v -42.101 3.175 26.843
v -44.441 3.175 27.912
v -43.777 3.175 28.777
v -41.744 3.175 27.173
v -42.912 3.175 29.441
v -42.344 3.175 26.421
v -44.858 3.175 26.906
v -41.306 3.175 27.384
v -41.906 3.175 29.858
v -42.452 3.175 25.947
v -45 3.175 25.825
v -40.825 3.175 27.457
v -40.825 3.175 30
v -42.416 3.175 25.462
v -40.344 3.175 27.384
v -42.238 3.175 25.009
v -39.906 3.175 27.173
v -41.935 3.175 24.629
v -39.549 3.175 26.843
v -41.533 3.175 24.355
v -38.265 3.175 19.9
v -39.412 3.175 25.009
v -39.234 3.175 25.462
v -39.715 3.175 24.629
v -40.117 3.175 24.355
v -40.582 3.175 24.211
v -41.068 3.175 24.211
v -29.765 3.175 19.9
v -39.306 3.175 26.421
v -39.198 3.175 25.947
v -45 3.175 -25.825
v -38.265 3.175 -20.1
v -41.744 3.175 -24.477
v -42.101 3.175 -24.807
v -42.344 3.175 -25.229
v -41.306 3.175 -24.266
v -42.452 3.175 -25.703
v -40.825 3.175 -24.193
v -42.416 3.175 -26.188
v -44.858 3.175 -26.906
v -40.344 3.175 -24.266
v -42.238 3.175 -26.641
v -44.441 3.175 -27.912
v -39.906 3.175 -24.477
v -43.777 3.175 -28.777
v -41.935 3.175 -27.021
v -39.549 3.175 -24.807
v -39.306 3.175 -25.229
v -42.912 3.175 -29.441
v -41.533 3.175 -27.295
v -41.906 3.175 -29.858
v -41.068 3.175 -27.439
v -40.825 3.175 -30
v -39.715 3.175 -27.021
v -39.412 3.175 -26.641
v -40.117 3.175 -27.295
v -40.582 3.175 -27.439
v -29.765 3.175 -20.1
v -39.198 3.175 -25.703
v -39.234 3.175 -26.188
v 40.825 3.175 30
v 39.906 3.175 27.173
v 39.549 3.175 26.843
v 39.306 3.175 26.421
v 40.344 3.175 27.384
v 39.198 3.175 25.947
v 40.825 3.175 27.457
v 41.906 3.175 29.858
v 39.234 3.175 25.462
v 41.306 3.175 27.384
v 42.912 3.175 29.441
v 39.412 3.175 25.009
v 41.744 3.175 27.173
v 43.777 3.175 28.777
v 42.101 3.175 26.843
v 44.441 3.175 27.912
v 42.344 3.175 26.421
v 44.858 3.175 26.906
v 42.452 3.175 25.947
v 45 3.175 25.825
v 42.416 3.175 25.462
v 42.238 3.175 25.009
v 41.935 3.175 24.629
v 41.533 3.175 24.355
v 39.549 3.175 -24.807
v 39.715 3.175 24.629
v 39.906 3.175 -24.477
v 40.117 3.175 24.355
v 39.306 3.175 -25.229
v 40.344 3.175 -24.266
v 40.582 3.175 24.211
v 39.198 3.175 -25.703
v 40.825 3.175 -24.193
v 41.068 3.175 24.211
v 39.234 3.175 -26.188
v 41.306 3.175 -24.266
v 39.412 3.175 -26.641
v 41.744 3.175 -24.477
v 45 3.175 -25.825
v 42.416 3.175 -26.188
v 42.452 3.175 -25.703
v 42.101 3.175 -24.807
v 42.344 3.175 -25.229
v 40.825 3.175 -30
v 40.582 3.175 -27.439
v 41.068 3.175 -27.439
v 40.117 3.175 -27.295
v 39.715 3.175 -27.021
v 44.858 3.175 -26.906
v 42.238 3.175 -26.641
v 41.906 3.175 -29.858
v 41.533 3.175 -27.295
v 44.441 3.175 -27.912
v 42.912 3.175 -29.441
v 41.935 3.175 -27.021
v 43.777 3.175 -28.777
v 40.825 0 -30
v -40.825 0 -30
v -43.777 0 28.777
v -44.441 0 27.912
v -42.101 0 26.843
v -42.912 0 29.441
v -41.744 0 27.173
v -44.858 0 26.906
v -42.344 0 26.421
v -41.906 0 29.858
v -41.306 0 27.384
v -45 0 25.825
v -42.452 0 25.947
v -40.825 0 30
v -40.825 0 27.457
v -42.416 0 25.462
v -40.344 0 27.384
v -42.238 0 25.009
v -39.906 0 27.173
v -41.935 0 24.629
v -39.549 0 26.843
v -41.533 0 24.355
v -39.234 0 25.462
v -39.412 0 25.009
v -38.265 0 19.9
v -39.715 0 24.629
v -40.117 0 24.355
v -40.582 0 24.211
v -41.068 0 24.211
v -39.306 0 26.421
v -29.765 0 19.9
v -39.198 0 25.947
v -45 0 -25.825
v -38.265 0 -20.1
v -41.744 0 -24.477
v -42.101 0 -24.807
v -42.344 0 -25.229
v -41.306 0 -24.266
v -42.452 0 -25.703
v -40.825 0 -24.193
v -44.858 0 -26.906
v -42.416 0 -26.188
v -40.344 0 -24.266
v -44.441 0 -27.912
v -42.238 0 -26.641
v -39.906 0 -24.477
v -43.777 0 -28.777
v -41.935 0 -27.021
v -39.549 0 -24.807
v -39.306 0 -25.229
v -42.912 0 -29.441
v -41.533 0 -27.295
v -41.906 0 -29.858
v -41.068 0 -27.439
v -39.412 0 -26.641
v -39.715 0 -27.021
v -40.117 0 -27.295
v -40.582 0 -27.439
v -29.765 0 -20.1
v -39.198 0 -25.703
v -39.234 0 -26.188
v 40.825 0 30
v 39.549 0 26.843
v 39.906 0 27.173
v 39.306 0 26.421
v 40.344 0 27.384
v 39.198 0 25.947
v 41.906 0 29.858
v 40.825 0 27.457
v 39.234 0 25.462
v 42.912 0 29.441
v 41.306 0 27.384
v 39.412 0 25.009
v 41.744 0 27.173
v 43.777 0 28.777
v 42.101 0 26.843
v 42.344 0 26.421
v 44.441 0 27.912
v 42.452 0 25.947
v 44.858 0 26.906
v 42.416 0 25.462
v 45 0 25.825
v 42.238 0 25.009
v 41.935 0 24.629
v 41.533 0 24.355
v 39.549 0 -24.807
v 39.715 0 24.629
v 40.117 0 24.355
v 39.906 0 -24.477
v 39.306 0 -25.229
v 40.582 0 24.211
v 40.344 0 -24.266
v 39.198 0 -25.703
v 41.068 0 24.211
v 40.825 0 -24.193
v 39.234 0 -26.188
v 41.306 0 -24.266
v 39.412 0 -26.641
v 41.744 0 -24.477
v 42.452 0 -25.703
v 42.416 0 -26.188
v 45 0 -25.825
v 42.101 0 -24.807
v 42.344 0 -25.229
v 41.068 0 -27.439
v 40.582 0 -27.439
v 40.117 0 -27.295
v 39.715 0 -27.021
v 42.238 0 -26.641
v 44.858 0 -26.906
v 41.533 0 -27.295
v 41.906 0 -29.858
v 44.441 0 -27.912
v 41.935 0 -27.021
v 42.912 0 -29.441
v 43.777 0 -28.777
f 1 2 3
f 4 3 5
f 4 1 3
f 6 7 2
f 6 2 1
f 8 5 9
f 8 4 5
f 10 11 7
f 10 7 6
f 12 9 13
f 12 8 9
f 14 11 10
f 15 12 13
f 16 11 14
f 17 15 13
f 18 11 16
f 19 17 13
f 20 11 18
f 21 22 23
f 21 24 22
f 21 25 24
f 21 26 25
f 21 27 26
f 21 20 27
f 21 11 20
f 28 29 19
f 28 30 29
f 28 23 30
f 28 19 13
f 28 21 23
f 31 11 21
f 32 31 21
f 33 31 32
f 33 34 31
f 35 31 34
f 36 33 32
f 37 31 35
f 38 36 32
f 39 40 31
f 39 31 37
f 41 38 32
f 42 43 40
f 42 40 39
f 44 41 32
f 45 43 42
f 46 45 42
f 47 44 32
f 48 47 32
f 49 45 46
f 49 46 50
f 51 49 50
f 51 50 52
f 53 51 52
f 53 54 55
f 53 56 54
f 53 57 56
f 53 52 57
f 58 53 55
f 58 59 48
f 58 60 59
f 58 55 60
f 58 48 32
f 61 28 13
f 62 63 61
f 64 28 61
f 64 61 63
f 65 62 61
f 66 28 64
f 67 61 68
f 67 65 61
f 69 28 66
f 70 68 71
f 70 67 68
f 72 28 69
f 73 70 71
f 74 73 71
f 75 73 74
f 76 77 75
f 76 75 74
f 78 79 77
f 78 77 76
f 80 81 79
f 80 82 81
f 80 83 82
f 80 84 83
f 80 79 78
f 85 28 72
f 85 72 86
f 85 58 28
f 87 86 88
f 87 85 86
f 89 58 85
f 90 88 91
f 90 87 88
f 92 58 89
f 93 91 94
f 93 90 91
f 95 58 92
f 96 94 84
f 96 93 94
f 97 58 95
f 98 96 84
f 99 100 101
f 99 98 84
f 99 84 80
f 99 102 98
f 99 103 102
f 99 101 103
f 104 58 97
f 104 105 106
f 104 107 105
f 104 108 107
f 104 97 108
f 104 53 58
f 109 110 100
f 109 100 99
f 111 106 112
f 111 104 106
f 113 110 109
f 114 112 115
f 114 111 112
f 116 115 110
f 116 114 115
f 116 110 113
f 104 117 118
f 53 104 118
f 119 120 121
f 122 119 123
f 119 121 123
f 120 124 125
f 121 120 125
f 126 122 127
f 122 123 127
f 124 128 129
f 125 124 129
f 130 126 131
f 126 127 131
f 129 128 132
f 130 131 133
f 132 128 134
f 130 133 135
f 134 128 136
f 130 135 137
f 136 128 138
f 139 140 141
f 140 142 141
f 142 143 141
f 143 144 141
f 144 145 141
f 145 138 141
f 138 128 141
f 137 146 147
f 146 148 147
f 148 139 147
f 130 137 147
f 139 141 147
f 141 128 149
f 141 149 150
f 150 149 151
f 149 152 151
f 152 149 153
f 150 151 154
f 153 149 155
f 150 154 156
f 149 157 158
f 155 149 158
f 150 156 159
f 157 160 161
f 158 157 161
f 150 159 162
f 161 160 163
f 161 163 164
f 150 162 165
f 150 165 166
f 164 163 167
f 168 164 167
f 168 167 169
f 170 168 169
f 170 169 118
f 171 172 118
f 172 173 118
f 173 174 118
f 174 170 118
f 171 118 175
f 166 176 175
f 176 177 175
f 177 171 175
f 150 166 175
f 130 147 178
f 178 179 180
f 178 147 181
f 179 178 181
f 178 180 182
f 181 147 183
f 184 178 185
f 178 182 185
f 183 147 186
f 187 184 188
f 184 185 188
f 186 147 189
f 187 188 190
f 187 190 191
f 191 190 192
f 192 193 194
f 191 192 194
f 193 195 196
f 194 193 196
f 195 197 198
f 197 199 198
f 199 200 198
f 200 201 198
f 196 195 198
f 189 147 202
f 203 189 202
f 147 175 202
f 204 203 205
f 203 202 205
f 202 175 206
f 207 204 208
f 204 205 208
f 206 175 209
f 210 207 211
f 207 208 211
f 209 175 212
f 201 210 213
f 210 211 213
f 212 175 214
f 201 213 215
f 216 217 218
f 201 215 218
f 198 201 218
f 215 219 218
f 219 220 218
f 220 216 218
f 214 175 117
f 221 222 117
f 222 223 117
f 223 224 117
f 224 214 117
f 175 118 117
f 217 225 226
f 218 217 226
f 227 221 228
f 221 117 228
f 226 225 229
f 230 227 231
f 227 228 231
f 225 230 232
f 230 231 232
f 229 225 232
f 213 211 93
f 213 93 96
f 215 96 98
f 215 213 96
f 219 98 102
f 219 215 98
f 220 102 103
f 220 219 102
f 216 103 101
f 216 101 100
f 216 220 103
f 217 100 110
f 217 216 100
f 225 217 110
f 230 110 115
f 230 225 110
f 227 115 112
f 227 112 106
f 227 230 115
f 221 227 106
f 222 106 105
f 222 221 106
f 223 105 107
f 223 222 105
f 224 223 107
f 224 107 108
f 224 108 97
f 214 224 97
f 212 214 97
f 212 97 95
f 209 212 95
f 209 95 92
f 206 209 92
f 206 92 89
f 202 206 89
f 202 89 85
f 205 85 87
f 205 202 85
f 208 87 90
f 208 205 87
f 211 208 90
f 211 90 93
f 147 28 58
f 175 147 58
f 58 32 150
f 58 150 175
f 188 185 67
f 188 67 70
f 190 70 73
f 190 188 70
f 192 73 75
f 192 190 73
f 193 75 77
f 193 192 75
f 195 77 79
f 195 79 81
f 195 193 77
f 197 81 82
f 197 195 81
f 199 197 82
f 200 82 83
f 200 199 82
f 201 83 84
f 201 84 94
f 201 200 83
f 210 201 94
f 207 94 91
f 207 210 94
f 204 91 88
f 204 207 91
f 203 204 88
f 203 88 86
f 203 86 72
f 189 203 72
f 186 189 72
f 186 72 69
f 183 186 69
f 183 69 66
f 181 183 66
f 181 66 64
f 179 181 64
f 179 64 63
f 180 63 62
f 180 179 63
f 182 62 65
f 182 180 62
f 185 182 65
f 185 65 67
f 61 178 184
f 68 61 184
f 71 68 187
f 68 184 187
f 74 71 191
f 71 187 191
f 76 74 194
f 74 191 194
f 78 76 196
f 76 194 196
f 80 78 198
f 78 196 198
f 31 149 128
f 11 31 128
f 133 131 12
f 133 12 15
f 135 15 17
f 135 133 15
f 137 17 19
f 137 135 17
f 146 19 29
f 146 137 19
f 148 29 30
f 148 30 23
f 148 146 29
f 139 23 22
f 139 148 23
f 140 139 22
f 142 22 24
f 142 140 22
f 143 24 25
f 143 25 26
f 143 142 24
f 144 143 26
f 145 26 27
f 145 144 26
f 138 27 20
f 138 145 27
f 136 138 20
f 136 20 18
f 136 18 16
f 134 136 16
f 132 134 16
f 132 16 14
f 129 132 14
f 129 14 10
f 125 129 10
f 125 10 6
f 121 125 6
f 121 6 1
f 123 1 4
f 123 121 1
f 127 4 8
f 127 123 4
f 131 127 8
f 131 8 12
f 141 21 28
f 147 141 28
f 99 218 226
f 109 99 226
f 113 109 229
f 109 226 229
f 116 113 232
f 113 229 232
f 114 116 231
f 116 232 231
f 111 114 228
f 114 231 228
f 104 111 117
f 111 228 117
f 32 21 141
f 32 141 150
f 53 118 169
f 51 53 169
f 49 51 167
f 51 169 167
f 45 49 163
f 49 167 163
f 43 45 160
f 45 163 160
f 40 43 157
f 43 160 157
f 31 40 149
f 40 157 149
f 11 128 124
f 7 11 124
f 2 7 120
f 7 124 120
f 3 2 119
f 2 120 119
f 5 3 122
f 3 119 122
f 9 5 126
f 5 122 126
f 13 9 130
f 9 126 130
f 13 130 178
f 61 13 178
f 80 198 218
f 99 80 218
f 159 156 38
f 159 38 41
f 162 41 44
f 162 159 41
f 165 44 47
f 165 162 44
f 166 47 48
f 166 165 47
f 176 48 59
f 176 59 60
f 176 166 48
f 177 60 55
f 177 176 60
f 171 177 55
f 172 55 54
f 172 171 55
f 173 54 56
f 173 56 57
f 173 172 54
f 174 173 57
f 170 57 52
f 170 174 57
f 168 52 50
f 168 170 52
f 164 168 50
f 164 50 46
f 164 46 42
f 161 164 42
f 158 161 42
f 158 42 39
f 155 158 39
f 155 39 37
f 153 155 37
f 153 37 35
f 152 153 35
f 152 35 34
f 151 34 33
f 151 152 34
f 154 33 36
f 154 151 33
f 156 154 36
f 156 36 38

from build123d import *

# Parameters (mm, degrees)
SKETCH2_R           = 1.63195
BOSS_EXTRUDE3_DEPTH = 3.175
SKETCH3_W           = 8.5
SKETCH3_H           = 40
CUT_EXTRUDE1_DEPTH  = 55.176384385


with BuildPart() as part:
    # Sketch2 → Boss-Extrude3 (new body)
    with BuildSketch(Plane(origin=(0, 0, 0), x_dir=(1, 0, 0), z_dir=(0, 1, 0))):
        with BuildLine():
            Line((-45, 25.825), (-45, -25.825))
            ThreePointArc((-45, -25.825), (-43.777170811, -28.777170811), (-40.825, -30))
            Line((-40.825, -30), (40.825, -30))
            ThreePointArc((40.825, -30), (43.777170811, -28.777170811), (45, -25.825))
            Line((45, -25.825), (45, 25.825))
            ThreePointArc((45, 25.825), (43.777170811, 28.777170811), (40.825, 30))
            Line((40.825, 30), (-40.825, 30))
            ThreePointArc((-40.825, 30), (-43.777170811, 28.777170811), (-45, 25.825))
        make_face()
        with Locations(Location((40.825, 25.825, 0), (0, 0, 270))):
            Circle(SKETCH2_R, mode=Mode.SUBTRACT)
        with Locations(Location((40.825, -25.825, 0), (0, 0, 270))):
            Circle(SKETCH2_R, mode=Mode.SUBTRACT)
        with Locations(Location((-40.825, 25.825, 0), (0, 0, 270))):
            Circle(SKETCH2_R, mode=Mode.SUBTRACT)
        with Locations(Location((-40.825, -25.825, 0), (0, 0, 270))):
            Circle(SKETCH2_R, mode=Mode.SUBTRACT)
    extrude(amount=BOSS_EXTRUDE3_DEPTH)

    # Sketch3 → Cut-Extrude1 (cut, through all)
    with BuildSketch(Plane(origin=(0, 3.175, 0), x_dir=(1, 0, 0), z_dir=(0, 1, 0))):
        with Locations((-34.015313808, 0.1)):
            Rectangle(SKETCH3_W, SKETCH3_H)
    extrude(amount=-CUT_EXTRUDE1_DEPTH, mode=Mode.SUBTRACT)


solid = part.part
